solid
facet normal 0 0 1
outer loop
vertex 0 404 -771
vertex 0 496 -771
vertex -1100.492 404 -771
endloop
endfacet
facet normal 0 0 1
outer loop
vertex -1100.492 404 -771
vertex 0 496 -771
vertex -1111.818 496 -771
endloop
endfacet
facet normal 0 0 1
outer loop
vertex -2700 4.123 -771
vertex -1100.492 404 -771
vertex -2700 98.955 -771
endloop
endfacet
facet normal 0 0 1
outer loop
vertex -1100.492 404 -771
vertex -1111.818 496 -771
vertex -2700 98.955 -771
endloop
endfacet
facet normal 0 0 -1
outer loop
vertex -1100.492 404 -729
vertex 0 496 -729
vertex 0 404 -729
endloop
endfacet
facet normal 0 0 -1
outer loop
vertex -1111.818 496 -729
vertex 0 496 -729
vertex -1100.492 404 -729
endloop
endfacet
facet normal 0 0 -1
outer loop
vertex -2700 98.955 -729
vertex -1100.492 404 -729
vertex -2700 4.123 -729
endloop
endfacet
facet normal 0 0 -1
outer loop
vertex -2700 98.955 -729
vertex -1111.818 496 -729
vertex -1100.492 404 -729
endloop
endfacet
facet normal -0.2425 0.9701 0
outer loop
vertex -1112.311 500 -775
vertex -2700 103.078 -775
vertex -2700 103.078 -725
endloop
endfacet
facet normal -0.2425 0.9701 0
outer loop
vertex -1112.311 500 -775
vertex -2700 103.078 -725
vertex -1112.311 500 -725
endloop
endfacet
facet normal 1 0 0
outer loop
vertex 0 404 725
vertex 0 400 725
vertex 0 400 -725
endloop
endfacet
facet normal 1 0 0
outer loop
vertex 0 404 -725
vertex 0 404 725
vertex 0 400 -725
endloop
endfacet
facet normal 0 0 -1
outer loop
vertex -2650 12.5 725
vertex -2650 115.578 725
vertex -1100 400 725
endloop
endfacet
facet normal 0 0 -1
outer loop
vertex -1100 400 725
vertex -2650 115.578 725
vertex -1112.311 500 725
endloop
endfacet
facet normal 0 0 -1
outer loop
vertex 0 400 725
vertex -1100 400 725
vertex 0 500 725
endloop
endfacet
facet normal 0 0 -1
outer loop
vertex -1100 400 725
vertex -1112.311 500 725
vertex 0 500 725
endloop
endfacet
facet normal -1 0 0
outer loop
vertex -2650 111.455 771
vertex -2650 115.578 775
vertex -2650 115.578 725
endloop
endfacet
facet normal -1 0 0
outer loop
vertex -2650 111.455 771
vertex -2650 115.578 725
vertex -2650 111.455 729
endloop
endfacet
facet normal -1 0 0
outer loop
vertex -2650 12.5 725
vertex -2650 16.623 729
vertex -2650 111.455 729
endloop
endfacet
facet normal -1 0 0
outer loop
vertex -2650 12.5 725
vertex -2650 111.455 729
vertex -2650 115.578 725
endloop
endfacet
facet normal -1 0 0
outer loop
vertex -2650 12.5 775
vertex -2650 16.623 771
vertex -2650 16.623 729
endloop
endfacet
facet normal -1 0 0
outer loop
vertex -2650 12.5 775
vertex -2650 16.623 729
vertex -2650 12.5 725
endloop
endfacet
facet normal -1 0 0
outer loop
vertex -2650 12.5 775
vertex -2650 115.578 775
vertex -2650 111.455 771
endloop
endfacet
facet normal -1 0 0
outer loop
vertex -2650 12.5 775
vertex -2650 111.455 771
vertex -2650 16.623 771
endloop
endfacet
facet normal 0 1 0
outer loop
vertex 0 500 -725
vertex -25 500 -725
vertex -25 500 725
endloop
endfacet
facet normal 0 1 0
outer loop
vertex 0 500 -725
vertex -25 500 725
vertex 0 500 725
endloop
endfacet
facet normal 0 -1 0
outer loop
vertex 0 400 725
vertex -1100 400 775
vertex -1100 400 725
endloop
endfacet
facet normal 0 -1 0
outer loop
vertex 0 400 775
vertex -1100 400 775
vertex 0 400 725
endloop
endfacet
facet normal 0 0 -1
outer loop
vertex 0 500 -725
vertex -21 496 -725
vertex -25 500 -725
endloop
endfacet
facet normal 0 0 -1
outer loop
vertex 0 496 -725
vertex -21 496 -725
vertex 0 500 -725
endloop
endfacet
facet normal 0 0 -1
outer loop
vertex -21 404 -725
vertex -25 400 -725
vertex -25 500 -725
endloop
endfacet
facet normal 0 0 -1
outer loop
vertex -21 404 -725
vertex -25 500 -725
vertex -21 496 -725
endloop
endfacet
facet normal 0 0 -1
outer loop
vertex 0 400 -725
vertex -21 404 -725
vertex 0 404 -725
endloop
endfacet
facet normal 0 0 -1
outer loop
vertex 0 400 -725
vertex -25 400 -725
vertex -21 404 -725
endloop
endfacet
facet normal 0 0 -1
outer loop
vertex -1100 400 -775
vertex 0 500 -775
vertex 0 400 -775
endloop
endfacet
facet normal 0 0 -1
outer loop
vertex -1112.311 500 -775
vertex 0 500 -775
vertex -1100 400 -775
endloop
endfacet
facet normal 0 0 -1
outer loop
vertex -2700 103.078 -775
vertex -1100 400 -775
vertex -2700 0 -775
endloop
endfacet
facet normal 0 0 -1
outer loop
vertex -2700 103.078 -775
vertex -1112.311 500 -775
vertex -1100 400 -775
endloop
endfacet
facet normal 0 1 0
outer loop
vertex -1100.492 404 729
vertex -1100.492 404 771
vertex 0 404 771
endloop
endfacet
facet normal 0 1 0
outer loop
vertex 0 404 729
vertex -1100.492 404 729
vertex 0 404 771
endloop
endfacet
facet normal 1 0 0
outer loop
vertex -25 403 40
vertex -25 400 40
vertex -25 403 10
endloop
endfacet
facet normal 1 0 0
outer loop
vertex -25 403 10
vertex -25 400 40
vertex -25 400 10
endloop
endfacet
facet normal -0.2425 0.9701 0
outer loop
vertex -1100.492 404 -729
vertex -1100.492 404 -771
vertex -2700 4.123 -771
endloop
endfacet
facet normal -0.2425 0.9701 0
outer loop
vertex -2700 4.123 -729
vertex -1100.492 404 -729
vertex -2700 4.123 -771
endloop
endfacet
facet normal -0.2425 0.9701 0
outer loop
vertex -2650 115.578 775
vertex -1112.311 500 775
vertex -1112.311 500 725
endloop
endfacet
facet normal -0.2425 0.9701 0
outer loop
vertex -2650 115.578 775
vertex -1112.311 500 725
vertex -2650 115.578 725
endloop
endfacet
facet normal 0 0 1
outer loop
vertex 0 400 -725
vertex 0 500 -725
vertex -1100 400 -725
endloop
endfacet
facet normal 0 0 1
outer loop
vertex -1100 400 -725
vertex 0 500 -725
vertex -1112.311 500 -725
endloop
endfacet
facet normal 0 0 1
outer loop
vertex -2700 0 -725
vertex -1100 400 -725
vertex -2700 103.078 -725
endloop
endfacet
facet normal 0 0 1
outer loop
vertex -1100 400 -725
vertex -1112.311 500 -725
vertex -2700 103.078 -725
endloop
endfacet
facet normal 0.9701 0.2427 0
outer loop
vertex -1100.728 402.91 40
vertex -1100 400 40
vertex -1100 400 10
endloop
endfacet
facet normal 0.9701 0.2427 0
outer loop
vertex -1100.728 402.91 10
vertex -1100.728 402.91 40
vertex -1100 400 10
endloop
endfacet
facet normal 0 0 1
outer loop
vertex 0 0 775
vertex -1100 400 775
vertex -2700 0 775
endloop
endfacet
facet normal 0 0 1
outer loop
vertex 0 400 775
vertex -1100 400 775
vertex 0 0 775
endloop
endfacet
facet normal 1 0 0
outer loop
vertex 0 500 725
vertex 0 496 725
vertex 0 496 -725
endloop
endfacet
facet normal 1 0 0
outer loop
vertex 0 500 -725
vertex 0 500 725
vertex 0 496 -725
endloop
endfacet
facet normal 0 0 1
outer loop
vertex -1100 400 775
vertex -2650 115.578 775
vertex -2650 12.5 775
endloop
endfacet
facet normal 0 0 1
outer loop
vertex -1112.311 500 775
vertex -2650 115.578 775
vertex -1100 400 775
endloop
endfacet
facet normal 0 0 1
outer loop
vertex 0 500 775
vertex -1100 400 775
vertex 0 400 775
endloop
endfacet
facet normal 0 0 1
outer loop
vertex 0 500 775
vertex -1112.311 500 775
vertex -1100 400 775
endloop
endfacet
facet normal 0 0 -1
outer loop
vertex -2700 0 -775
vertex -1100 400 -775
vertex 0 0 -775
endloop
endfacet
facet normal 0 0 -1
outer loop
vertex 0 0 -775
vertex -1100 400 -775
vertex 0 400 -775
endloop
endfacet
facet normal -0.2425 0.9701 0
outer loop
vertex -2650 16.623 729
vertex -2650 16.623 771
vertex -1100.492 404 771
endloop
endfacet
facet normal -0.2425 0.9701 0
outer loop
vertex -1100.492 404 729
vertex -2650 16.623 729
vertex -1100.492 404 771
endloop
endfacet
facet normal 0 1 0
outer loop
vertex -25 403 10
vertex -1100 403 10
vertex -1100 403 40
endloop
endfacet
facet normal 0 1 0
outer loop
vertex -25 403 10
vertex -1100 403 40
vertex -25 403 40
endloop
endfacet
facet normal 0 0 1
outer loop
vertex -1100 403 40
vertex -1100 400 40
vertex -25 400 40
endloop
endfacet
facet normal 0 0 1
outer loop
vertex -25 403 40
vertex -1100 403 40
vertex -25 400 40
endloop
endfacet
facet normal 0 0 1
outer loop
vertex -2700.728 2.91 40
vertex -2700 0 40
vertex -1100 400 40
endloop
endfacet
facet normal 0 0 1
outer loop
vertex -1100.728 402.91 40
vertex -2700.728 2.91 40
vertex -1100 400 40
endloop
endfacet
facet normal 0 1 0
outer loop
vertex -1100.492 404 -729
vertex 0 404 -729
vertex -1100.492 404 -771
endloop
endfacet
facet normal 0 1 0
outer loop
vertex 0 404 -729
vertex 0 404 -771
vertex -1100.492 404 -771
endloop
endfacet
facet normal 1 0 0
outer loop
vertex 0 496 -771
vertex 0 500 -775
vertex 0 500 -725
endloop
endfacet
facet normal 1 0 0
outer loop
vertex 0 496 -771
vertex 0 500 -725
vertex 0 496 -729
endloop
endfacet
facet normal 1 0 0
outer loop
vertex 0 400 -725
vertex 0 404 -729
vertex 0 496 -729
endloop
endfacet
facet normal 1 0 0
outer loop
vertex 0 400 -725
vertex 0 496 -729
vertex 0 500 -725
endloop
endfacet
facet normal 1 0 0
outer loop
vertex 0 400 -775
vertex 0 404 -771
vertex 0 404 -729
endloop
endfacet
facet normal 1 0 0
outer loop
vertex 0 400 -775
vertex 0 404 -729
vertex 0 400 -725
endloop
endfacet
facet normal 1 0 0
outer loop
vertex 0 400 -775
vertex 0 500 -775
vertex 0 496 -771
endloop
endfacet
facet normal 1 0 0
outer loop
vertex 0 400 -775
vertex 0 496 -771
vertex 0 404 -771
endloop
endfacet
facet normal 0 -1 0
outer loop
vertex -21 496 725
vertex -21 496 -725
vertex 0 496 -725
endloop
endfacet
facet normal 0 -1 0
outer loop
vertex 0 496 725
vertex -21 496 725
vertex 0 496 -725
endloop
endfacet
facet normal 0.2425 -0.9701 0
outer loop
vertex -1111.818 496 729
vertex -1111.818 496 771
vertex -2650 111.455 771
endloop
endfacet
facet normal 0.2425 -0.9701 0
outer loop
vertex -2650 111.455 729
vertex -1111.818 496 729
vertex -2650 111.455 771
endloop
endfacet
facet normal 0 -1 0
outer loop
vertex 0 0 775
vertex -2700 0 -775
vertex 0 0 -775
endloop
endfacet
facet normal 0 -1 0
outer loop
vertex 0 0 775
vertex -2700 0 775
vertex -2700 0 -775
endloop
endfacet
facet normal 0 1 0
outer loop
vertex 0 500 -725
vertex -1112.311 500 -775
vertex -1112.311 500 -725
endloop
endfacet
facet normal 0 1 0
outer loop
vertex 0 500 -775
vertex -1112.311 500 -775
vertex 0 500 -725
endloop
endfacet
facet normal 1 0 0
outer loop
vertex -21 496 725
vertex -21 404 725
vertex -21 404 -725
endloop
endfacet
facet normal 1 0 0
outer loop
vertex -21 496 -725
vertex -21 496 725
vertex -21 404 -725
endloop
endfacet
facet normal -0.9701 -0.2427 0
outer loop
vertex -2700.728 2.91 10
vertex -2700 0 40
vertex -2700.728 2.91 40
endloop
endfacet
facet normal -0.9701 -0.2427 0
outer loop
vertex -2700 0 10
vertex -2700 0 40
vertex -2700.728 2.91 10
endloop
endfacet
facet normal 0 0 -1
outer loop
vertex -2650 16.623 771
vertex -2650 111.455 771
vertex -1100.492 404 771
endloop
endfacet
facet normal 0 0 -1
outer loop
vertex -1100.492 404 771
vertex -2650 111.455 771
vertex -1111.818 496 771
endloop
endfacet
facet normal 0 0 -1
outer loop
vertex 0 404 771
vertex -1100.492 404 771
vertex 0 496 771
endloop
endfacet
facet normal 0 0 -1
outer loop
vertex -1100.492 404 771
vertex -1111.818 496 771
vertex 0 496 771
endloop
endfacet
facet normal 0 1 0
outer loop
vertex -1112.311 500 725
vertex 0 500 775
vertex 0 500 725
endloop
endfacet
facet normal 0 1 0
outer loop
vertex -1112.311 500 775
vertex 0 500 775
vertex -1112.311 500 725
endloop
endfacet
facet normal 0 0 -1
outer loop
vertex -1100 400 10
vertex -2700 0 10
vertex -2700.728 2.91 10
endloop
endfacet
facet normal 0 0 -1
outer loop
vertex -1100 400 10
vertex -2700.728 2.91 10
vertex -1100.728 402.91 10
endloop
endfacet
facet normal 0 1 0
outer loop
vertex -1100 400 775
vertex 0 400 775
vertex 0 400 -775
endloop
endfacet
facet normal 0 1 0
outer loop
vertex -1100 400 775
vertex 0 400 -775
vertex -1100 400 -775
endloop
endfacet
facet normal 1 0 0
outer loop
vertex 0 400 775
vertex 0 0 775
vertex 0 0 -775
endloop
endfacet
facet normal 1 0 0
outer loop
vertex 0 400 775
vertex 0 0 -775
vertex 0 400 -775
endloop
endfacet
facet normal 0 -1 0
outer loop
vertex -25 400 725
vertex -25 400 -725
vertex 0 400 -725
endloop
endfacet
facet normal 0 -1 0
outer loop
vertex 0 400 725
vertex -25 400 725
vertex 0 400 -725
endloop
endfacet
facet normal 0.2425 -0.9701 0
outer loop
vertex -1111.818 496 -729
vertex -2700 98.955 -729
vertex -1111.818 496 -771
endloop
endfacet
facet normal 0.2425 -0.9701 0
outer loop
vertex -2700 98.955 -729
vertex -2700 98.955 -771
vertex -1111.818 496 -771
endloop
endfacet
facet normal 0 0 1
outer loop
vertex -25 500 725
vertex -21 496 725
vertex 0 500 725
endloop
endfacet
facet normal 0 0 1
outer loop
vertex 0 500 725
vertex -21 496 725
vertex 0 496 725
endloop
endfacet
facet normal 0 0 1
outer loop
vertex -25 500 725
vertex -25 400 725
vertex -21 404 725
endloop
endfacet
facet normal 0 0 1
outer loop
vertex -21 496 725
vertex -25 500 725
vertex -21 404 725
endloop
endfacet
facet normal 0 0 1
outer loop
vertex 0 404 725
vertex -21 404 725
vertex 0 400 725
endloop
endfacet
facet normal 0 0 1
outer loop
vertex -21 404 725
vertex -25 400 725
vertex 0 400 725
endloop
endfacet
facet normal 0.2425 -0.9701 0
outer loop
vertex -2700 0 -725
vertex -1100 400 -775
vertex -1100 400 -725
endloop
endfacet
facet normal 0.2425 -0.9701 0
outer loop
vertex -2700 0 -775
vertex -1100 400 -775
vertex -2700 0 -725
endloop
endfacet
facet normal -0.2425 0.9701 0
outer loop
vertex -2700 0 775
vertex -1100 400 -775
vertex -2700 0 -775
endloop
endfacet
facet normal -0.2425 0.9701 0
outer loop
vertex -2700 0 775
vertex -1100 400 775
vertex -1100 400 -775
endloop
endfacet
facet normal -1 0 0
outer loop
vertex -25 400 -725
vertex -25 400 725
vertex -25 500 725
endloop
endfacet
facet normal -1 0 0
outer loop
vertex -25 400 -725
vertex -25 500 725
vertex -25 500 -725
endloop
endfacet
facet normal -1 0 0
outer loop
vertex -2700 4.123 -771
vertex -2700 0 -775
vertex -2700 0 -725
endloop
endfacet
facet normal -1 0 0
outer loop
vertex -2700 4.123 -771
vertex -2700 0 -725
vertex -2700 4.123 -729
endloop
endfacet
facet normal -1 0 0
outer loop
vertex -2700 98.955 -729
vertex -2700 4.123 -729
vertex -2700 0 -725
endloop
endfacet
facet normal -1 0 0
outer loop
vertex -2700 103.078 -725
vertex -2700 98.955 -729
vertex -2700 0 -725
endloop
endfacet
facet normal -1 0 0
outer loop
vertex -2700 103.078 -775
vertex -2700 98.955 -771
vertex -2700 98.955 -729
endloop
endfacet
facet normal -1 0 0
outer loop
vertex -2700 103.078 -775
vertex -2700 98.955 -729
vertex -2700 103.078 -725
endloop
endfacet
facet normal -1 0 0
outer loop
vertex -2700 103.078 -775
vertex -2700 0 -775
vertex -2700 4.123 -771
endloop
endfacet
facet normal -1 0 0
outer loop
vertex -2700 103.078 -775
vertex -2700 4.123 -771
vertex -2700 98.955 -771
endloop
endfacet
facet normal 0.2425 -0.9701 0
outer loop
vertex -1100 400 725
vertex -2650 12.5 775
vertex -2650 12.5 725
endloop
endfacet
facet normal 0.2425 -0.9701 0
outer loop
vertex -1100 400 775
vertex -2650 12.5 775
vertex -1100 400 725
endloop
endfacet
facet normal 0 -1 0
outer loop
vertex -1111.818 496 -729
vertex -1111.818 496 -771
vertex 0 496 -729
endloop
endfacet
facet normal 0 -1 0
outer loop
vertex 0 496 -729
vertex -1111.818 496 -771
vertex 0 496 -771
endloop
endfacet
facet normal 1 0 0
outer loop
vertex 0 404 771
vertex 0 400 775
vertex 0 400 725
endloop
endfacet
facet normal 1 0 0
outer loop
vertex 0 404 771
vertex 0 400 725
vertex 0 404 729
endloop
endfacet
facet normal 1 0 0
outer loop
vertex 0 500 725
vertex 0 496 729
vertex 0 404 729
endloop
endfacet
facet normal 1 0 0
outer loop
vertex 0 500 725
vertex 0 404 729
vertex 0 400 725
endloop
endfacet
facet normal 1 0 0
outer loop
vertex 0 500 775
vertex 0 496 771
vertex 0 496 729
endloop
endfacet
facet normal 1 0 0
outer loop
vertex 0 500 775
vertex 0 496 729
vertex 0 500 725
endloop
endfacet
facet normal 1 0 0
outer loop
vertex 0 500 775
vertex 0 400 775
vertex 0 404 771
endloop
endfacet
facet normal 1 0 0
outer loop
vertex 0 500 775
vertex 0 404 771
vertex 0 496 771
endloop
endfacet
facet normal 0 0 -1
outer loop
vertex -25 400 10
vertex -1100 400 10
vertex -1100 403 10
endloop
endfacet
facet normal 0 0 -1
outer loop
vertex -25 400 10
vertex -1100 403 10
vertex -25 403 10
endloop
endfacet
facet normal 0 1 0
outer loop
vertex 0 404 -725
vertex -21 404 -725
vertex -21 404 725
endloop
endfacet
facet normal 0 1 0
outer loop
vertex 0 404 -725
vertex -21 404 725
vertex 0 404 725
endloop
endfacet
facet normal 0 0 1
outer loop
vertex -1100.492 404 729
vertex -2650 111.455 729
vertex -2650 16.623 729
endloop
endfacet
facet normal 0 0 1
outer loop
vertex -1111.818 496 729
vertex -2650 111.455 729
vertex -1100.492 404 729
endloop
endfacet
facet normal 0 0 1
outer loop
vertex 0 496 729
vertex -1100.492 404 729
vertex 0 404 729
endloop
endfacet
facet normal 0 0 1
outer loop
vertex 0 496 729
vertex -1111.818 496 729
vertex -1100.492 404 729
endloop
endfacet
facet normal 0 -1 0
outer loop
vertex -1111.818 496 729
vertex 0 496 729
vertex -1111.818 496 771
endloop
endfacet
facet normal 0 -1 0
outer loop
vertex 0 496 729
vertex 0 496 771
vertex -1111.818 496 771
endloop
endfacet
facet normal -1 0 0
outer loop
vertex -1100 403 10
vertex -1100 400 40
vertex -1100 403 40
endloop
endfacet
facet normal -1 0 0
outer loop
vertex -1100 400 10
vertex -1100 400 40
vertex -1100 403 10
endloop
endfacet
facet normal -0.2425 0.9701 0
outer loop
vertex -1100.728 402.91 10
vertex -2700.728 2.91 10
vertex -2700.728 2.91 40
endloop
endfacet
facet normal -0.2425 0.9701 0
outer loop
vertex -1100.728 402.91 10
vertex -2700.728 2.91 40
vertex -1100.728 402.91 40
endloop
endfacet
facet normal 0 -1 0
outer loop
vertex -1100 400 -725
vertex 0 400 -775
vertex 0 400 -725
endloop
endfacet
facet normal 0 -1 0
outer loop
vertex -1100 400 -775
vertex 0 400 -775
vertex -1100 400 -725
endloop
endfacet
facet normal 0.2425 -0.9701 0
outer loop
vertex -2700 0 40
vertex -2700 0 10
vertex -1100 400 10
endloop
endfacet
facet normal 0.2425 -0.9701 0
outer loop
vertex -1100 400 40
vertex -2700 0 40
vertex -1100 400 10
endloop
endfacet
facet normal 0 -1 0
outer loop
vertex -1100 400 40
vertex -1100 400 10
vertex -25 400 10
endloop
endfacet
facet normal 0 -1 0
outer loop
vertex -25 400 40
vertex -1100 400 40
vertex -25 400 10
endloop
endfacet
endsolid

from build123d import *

# Parameters (mm, degrees)
BOSS_EXTRUDE1_DEPTH      = 775
BOSS_EXTRUDE1_DEPTH_BACK = 775
BOSS_EXTRUDE2_DEPTH      = 50
SHELL1_T                 = -4
BOSS_EXTRUDE3_DEPTH      = 50
SHELL2_T                 = -4
SKETCH5_W                = 25
SKETCH5_H                = 1450
BOSS_EXTRUDE4_DEPTH      = 100
SHELL3_T                 = -4
SKETCH7_W                = 1075
SKETCH7_H                = 30
BOSS_EXTRUDE5_DEPTH      = 3
SKETCH8_W                = 1649.242250247
SKETCH8_H                = 30
BOSS_EXTRUDE6_DEPTH      = 3


with BuildPart() as part:
    # Sketch1 → Boss-Extrude1 (new, two sides: drawn at the far end of the back side and taken through both)
    with BuildSketch(Plane.XY.offset(-BOSS_EXTRUDE1_DEPTH_BACK)):
        Polygon((-2700, 0), (0, 0), (0, 400), (-1100, 400), align=None)
    extrude(amount=BOSS_EXTRUDE1_DEPTH + BOSS_EXTRUDE1_DEPTH_BACK)


with BuildPart() as body_2:
    # Sketch3 → Boss-Extrude2 (new body)
    with BuildSketch(Plane.XY.offset(775)):
        Polygon((-2650, 115.57764064), (-2650, 12.5), (-1100, 400), (0, 400), (0, 500), (-1112.310562562, 500), align=None)
    extrude(amount=-BOSS_EXTRUDE2_DEPTH)

    # Shell1
    shell1_openings = [body_2.faces().sort_by_distance(p)[0] for p in [
        (0, 450, 750),
        (-2650, 64.03882032, 750),
    ]]
    offset(amount=SHELL1_T, openings=shell1_openings, kind=Kind.INTERSECTION)


with BuildPart() as body_3:
    # Sketch4 → Boss-Extrude3 (new body)
    with BuildSketch(Plane(origin=(0, 0, -775), x_dir=(-1, 0, 0), z_dir=(0, 0, -1))):
        Polygon((1100, 400), (2650, 12.5), (2700, 0), (2700, 103.07764064), (2650, 115.57764064), (1112.310562562, 500), (0, 500), (0, 400), align=None)
    extrude(amount=-BOSS_EXTRUDE3_DEPTH)

    # Shell2
    shell2_openings = [body_3.faces().sort_by_distance(p)[0] for p in [
        (-2700, 51.53882032, -750),
        (0, 450, -750),
    ]]
    offset(amount=SHELL2_T, openings=shell2_openings, kind=Kind.INTERSECTION)


with BuildPart() as body_4:
    # Sketch5 → Boss-Extrude4 (new body)
    with BuildSketch(Plane(origin=(0, 400, 0), x_dir=(1, 0, 0), z_dir=(0, 1, 0))):
        with Locations((-12.5, 0)):
            Rectangle(SKETCH5_W, SKETCH5_H)
    extrude(amount=BOSS_EXTRUDE4_DEPTH)

    # Shell3
    shell3_openings = [body_4.faces().sort_by_distance(p)[0] for p in [
        (-12.5, 450, -725),
        (0, 450, 0),
        (-12.5, 450, 725),
    ]]
    offset(amount=SHELL3_T, openings=shell3_openings, kind=Kind.INTERSECTION)


with BuildPart() as body_5:
    # Sketch7 → Boss-Extrude5 (new body)
    with BuildSketch(Plane(origin=(0, 400, 0), x_dir=(1, 0, 0), z_dir=(0, 1, 0))):
        with Locations((-562.5, -25)):
            Rectangle(SKETCH7_W, SKETCH7_H)
    extrude(amount=BOSS_EXTRUDE5_DEPTH)


with BuildPart() as body_6:
    # Sketch8 → Boss-Extrude6 (new body)
    with BuildSketch(Plane(origin=(-158.823529412, 635.294117647, 0), x_dir=(0.970142500145332, 0.24253562503633297, 0), z_dir=(-0.24253562503633297, 0.970142500145332, 0))):
        with Locations((-1794.763625269, -25)):
            Rectangle(SKETCH8_W, SKETCH8_H)
    extrude(amount=BOSS_EXTRUDE6_DEPTH)


solid = Compound([part.part, body_2.part, body_3.part, body_4.part, body_5.part, body_6.part])
